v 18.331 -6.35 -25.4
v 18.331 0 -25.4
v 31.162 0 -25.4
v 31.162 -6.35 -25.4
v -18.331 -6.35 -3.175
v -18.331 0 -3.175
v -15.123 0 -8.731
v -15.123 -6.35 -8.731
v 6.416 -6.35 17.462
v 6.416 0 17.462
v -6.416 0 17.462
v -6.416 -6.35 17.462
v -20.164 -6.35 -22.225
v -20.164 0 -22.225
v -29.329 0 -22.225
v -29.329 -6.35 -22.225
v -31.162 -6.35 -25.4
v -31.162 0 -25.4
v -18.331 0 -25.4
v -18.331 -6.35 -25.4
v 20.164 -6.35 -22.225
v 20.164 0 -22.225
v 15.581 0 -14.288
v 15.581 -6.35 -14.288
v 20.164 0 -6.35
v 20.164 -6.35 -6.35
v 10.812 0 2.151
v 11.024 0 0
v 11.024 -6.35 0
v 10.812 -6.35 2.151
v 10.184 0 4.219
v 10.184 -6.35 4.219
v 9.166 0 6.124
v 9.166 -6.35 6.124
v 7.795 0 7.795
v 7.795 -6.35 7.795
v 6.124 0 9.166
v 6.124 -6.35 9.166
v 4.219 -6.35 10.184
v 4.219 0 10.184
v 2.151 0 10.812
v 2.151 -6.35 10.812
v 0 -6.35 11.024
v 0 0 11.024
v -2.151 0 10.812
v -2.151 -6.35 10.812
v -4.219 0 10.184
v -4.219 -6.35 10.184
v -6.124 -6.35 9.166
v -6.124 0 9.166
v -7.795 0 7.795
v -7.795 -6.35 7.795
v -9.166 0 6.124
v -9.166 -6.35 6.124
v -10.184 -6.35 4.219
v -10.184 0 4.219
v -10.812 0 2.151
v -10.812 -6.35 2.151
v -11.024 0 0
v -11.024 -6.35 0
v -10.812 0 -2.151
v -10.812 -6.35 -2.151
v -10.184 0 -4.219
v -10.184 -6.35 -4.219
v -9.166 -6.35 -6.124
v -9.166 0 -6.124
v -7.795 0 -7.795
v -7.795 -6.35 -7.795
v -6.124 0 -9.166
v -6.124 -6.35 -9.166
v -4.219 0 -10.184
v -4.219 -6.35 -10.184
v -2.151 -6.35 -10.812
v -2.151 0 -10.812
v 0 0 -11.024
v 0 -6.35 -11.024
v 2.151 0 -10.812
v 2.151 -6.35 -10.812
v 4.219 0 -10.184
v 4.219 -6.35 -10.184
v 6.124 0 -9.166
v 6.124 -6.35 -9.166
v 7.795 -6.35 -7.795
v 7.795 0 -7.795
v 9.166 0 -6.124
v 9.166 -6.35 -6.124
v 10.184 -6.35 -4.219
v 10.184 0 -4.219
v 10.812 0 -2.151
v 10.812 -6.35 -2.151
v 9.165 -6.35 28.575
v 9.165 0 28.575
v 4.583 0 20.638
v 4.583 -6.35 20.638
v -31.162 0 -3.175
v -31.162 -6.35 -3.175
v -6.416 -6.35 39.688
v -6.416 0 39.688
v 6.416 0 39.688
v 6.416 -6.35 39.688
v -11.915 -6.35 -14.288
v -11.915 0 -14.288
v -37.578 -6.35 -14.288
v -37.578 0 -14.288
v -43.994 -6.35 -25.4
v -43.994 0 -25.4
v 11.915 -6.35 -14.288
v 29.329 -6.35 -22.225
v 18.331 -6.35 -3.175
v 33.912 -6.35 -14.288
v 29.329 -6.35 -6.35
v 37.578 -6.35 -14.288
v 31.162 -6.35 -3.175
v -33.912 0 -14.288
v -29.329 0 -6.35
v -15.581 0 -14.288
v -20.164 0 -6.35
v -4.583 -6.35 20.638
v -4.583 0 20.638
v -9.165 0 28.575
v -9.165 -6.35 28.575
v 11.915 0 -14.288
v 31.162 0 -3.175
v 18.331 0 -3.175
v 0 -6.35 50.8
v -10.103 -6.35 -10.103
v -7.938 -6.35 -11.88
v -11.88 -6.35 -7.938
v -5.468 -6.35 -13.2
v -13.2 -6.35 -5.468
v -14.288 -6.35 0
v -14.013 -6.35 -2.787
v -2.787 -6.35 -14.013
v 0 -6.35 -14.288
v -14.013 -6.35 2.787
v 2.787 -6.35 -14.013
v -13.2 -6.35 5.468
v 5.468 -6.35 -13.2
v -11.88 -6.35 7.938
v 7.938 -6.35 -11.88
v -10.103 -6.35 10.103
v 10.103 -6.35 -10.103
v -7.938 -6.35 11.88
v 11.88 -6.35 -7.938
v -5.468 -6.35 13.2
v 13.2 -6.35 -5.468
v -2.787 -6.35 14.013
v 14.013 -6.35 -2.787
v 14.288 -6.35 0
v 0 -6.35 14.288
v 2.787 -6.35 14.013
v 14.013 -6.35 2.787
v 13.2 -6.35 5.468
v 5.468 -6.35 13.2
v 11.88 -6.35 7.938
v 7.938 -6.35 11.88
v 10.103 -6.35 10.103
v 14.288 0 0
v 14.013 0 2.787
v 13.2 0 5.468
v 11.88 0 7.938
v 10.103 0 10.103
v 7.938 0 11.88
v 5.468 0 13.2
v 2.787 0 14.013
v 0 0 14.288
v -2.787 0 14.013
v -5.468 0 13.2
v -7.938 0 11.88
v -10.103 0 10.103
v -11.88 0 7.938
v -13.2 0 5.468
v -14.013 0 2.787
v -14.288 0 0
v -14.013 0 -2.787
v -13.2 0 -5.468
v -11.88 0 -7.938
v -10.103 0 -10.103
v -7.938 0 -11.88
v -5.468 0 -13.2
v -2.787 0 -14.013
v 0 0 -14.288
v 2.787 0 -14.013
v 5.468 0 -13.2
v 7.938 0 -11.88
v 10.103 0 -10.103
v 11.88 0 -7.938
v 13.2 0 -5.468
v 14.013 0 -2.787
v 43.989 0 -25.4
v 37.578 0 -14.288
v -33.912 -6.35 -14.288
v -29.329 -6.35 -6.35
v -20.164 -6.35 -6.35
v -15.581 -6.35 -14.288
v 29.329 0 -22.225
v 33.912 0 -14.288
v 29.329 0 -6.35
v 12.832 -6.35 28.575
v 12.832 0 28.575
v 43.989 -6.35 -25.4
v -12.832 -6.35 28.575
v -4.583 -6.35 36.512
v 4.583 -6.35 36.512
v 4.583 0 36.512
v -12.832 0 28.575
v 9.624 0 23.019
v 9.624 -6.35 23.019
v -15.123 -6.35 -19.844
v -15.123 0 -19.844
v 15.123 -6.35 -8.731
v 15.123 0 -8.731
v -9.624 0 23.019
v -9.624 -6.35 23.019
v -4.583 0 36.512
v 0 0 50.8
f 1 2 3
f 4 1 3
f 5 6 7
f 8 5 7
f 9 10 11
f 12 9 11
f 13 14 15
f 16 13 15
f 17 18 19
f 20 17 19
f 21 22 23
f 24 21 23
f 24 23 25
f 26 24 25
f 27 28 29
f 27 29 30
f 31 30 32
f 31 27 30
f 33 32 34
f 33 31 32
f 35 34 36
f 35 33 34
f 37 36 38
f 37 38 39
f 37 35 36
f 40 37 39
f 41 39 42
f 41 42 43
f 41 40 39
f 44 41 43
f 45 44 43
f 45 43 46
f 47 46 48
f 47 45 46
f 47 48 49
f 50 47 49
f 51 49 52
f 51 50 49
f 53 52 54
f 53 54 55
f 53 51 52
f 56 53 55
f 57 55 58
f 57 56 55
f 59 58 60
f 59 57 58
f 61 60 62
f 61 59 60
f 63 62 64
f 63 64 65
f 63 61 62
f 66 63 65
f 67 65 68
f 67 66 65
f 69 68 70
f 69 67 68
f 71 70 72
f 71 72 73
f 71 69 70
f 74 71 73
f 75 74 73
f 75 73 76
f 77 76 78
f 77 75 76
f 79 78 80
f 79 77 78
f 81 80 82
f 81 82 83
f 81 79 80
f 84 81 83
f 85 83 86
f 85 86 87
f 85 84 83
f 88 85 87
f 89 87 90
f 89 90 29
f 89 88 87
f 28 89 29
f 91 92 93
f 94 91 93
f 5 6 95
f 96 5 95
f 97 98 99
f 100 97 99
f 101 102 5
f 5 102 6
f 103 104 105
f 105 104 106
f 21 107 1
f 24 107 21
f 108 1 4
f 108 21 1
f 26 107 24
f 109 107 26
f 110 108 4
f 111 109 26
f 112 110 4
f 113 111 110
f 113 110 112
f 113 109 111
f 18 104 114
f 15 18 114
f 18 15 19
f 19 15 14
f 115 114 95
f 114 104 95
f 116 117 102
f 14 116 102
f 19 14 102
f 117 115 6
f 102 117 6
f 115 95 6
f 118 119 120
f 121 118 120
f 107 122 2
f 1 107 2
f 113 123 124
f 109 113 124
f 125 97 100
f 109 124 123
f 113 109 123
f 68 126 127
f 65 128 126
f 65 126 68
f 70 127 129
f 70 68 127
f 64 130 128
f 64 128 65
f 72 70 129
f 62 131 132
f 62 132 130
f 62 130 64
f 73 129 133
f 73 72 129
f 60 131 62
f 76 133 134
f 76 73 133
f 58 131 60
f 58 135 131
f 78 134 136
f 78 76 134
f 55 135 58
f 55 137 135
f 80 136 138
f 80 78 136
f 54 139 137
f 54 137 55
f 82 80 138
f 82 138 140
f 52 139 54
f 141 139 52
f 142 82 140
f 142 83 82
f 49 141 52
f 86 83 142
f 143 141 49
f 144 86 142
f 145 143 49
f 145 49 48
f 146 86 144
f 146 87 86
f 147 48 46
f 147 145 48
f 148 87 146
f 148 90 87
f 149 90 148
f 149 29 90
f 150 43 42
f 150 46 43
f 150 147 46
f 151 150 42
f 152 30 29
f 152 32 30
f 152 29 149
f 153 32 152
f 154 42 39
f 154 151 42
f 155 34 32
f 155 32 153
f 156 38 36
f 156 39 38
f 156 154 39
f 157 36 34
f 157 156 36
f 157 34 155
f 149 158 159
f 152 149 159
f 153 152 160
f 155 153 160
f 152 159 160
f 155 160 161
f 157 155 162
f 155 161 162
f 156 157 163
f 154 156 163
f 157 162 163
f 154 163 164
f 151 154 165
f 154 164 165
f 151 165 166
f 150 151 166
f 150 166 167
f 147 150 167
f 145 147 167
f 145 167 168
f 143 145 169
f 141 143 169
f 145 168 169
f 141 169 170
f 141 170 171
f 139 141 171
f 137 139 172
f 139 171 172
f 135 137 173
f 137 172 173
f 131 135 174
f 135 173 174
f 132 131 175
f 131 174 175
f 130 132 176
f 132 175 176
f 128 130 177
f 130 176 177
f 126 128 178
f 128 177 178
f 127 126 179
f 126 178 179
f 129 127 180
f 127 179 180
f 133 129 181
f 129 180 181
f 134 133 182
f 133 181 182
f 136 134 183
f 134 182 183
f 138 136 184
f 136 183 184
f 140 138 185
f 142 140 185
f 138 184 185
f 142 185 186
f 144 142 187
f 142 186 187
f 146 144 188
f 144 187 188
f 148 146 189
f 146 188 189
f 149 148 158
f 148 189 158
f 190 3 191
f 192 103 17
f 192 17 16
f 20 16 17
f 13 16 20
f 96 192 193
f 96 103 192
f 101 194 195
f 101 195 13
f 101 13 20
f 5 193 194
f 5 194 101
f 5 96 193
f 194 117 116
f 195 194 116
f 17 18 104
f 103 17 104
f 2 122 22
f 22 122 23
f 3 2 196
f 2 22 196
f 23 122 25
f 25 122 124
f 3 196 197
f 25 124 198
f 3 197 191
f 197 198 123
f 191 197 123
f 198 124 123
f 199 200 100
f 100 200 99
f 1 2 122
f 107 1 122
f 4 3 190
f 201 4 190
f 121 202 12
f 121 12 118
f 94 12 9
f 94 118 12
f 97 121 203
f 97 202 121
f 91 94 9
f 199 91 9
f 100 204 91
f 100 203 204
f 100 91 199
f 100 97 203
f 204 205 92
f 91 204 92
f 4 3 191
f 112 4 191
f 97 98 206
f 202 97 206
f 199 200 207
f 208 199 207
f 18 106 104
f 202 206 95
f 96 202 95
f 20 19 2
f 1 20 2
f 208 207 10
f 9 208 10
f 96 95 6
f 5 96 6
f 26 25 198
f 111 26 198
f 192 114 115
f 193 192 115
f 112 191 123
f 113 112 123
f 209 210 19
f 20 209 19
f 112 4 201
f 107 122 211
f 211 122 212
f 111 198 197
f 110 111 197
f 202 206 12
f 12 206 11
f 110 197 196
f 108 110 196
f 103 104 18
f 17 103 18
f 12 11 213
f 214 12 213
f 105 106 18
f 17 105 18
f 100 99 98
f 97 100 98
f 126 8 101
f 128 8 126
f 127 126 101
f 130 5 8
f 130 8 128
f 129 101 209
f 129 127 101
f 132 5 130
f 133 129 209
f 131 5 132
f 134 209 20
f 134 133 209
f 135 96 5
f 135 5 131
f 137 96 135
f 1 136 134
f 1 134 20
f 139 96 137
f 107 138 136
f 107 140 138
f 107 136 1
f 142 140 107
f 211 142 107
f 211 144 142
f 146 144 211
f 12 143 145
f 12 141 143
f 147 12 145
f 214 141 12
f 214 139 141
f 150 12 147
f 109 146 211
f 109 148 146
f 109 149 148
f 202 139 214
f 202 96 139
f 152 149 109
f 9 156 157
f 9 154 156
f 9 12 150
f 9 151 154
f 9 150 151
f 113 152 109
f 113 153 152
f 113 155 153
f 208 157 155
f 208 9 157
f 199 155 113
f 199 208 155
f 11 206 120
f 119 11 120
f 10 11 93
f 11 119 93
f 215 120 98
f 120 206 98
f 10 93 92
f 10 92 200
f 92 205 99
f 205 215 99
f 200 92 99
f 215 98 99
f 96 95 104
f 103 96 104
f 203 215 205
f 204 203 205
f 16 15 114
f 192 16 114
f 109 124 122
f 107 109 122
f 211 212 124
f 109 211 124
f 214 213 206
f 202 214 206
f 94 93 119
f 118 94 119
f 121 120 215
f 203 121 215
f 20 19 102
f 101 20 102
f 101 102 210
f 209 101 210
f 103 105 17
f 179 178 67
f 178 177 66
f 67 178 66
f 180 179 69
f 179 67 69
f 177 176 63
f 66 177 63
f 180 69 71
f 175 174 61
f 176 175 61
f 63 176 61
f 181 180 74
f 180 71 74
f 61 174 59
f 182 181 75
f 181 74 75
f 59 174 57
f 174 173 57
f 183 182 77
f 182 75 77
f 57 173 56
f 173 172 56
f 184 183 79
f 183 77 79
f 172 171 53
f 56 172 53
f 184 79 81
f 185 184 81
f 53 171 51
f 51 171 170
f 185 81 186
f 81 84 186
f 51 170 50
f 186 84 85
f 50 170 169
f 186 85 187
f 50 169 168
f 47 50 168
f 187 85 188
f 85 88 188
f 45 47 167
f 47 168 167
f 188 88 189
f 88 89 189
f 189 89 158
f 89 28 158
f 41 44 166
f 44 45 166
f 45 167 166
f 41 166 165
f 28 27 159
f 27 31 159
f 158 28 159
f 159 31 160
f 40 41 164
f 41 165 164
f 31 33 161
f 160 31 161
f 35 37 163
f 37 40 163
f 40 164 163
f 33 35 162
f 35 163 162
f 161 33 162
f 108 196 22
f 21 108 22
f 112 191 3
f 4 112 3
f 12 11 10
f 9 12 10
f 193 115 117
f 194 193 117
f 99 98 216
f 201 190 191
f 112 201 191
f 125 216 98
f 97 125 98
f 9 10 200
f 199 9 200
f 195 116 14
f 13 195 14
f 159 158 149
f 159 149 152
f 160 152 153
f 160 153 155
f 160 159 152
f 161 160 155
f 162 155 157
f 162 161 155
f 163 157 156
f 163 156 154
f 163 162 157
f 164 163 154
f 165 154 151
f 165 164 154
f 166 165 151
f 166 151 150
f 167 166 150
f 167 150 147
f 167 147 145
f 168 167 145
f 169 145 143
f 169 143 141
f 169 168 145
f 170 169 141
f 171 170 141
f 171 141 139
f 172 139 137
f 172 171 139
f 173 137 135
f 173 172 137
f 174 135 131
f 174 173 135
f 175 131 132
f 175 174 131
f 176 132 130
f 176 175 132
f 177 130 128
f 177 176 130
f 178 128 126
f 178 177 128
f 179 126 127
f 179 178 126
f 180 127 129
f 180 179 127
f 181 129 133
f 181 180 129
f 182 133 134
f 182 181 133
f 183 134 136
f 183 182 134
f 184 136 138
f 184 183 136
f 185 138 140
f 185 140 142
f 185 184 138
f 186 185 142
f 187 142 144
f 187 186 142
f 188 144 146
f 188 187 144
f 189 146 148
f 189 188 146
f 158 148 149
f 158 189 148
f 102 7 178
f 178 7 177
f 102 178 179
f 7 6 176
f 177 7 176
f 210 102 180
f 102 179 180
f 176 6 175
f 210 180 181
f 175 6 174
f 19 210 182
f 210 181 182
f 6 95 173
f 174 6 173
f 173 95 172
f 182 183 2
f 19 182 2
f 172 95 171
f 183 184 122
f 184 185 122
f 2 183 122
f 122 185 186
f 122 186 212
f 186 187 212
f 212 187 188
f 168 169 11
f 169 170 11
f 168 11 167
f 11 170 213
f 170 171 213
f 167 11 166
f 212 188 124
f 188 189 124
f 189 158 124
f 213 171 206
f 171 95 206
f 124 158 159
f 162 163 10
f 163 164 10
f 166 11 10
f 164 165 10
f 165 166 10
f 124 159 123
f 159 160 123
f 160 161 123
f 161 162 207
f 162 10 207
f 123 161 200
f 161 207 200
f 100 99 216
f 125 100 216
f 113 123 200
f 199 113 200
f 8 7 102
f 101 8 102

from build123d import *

# Parameters (mm, degrees)
F0_R     = 14.2875
F0_R_2   = 11.0236
F2_DEPTH = 6.35
F1_R     = 14.2875


with BuildPart() as f2:
    # F0 (on Front) → F2 (new body)
    with BuildSketch(Plane.XZ):
        Circle(F0_R)
        Circle(F0_R_2, mode=Mode.SUBTRACT)
    extrude(amount=F2_DEPTH)


with BuildPart() as f2b:
    # F0 (on Front) → F2, piece 2 (new body)
    with BuildSketch(Plane.XZ):
        Polygon((-6.4158048664, 17.4625), (6.4158048664, 17.4625), (12.8316097327, 28.575), (6.4158048664, 39.6875), (-6.4158048664, 39.6875), (-12.8316097327, 28.575), align=None)
        Polygon((9.1654355234, 28.575), (4.5827177617, 20.6375), (-4.5827177617, 20.6375), (-9.1654355234, 28.575), (-4.5827177617, 36.5125), (4.5827177617, 36.5125), align=None, mode=Mode.SUBTRACT)
    extrude(amount=F2_DEPTH)


with BuildPart() as f2c:
    # F0 (on Front) → F2, piece 3 (new body)
    with BuildSketch(Plane.XZ):
        Polygon((-18.3308710468, -3.175), (-31.1624807795, -3.175), (-37.5782856459, -14.2875), (-31.1624807795, -25.4), (-18.3308710468, -25.4), (-11.9150661804, -14.2875), align=None)
        Polygon((-29.3293936748, -6.35), (-20.1639581514, -6.35), (-15.5812403898, -14.2875), (-20.1639581514, -22.225), (-29.3293936748, -22.225), (-33.9121114365, -14.2875), align=None, mode=Mode.SUBTRACT)
    extrude(amount=F2_DEPTH)


with BuildPart() as f2d:
    # F0 (on Front) → F2, piece 4 (new body)
    with BuildSketch(Plane.XZ):
        Polygon((11.9150661804, -14.2875), (18.3308710468, -25.4), (31.1624807795, -25.4), (37.5782856459, -14.2875), (31.1624807795, -3.175), (18.3308710468, -3.175), align=None)
        Polygon((20.1639581514, -22.225), (15.5812403898, -14.2875), (20.1639581514, -6.35), (29.3293936748, -6.35), (33.9121114365, -14.2875), (29.3293936748, -22.225), align=None, mode=Mode.SUBTRACT)
    extrude(amount=F2_DEPTH)


with BuildPart() as f2e:
    # F1 (on Front) → F2, piece 5 (new body)
    with BuildSketch(Plane.XZ):
        Polygon((15.1229686272, -8.7312499764), (18.3308710468, -3.175), (24.7466759131, -3.175), (31.1624807795, -3.175), (12.8316097327, 28.575), (9.623707221, 23.018749864), (6.4158048664, 17.4625), (0, 17.4625), (-6.4158048664, 17.4625), (-9.6237072491, 23.0187499127), (-12.8316097327, 28.575), (-31.1624807795, -3.175), (-24.7466759131, -3.175), (-18.3308710468, -3.175), (-15.1229686466, -8.7312499429), (-11.9150661804, -14.2875), (-15.1229686921, -19.843750136), (-18.3308710468, -25.4), (18.3308710468, -25.4), (15.1229687517, -19.8437502392), (11.9150661804, -14.2875), align=None)
        Circle(F1_R, mode=Mode.SUBTRACT)
    extrude(amount=F2_DEPTH)


with BuildPart() as f2f:
    # F1 (on Front) → F2, piece 6 (new body)
    with BuildSketch(Plane.XZ):
        Polygon((0, 39.6875), (6.4158048664, 39.6875), (0, 50.8), (-6.4158048664, 39.6875), align=None)
    extrude(amount=F2_DEPTH)


with BuildPart() as f2g:
    # F1 (on Front) → F2, piece 7 (new body)
    with BuildSketch(Plane.XZ):
        Polygon((43.9894807795, -25.4), (37.5782856459, -14.2875), (34.3703831623, -19.8437500873), (31.1624807795, -25.4), align=None)
    extrude(amount=F2_DEPTH)


with BuildPart() as f2h:
    # F1 (on Front) → F2, piece 8 (new body)
    with BuildSketch(Plane.XZ):
        Polygon((-31.1624807795, -25.4), (-34.3703830746, -19.8437502392), (-37.5782856459, -14.2875), (-43.9940905122, -25.4), align=None)
    extrude(amount=F2_DEPTH)


solid = Compound([f2.part, f2b.part, f2c.part, f2d.part, f2e.part, f2f.part, f2g.part, f2h.part])
